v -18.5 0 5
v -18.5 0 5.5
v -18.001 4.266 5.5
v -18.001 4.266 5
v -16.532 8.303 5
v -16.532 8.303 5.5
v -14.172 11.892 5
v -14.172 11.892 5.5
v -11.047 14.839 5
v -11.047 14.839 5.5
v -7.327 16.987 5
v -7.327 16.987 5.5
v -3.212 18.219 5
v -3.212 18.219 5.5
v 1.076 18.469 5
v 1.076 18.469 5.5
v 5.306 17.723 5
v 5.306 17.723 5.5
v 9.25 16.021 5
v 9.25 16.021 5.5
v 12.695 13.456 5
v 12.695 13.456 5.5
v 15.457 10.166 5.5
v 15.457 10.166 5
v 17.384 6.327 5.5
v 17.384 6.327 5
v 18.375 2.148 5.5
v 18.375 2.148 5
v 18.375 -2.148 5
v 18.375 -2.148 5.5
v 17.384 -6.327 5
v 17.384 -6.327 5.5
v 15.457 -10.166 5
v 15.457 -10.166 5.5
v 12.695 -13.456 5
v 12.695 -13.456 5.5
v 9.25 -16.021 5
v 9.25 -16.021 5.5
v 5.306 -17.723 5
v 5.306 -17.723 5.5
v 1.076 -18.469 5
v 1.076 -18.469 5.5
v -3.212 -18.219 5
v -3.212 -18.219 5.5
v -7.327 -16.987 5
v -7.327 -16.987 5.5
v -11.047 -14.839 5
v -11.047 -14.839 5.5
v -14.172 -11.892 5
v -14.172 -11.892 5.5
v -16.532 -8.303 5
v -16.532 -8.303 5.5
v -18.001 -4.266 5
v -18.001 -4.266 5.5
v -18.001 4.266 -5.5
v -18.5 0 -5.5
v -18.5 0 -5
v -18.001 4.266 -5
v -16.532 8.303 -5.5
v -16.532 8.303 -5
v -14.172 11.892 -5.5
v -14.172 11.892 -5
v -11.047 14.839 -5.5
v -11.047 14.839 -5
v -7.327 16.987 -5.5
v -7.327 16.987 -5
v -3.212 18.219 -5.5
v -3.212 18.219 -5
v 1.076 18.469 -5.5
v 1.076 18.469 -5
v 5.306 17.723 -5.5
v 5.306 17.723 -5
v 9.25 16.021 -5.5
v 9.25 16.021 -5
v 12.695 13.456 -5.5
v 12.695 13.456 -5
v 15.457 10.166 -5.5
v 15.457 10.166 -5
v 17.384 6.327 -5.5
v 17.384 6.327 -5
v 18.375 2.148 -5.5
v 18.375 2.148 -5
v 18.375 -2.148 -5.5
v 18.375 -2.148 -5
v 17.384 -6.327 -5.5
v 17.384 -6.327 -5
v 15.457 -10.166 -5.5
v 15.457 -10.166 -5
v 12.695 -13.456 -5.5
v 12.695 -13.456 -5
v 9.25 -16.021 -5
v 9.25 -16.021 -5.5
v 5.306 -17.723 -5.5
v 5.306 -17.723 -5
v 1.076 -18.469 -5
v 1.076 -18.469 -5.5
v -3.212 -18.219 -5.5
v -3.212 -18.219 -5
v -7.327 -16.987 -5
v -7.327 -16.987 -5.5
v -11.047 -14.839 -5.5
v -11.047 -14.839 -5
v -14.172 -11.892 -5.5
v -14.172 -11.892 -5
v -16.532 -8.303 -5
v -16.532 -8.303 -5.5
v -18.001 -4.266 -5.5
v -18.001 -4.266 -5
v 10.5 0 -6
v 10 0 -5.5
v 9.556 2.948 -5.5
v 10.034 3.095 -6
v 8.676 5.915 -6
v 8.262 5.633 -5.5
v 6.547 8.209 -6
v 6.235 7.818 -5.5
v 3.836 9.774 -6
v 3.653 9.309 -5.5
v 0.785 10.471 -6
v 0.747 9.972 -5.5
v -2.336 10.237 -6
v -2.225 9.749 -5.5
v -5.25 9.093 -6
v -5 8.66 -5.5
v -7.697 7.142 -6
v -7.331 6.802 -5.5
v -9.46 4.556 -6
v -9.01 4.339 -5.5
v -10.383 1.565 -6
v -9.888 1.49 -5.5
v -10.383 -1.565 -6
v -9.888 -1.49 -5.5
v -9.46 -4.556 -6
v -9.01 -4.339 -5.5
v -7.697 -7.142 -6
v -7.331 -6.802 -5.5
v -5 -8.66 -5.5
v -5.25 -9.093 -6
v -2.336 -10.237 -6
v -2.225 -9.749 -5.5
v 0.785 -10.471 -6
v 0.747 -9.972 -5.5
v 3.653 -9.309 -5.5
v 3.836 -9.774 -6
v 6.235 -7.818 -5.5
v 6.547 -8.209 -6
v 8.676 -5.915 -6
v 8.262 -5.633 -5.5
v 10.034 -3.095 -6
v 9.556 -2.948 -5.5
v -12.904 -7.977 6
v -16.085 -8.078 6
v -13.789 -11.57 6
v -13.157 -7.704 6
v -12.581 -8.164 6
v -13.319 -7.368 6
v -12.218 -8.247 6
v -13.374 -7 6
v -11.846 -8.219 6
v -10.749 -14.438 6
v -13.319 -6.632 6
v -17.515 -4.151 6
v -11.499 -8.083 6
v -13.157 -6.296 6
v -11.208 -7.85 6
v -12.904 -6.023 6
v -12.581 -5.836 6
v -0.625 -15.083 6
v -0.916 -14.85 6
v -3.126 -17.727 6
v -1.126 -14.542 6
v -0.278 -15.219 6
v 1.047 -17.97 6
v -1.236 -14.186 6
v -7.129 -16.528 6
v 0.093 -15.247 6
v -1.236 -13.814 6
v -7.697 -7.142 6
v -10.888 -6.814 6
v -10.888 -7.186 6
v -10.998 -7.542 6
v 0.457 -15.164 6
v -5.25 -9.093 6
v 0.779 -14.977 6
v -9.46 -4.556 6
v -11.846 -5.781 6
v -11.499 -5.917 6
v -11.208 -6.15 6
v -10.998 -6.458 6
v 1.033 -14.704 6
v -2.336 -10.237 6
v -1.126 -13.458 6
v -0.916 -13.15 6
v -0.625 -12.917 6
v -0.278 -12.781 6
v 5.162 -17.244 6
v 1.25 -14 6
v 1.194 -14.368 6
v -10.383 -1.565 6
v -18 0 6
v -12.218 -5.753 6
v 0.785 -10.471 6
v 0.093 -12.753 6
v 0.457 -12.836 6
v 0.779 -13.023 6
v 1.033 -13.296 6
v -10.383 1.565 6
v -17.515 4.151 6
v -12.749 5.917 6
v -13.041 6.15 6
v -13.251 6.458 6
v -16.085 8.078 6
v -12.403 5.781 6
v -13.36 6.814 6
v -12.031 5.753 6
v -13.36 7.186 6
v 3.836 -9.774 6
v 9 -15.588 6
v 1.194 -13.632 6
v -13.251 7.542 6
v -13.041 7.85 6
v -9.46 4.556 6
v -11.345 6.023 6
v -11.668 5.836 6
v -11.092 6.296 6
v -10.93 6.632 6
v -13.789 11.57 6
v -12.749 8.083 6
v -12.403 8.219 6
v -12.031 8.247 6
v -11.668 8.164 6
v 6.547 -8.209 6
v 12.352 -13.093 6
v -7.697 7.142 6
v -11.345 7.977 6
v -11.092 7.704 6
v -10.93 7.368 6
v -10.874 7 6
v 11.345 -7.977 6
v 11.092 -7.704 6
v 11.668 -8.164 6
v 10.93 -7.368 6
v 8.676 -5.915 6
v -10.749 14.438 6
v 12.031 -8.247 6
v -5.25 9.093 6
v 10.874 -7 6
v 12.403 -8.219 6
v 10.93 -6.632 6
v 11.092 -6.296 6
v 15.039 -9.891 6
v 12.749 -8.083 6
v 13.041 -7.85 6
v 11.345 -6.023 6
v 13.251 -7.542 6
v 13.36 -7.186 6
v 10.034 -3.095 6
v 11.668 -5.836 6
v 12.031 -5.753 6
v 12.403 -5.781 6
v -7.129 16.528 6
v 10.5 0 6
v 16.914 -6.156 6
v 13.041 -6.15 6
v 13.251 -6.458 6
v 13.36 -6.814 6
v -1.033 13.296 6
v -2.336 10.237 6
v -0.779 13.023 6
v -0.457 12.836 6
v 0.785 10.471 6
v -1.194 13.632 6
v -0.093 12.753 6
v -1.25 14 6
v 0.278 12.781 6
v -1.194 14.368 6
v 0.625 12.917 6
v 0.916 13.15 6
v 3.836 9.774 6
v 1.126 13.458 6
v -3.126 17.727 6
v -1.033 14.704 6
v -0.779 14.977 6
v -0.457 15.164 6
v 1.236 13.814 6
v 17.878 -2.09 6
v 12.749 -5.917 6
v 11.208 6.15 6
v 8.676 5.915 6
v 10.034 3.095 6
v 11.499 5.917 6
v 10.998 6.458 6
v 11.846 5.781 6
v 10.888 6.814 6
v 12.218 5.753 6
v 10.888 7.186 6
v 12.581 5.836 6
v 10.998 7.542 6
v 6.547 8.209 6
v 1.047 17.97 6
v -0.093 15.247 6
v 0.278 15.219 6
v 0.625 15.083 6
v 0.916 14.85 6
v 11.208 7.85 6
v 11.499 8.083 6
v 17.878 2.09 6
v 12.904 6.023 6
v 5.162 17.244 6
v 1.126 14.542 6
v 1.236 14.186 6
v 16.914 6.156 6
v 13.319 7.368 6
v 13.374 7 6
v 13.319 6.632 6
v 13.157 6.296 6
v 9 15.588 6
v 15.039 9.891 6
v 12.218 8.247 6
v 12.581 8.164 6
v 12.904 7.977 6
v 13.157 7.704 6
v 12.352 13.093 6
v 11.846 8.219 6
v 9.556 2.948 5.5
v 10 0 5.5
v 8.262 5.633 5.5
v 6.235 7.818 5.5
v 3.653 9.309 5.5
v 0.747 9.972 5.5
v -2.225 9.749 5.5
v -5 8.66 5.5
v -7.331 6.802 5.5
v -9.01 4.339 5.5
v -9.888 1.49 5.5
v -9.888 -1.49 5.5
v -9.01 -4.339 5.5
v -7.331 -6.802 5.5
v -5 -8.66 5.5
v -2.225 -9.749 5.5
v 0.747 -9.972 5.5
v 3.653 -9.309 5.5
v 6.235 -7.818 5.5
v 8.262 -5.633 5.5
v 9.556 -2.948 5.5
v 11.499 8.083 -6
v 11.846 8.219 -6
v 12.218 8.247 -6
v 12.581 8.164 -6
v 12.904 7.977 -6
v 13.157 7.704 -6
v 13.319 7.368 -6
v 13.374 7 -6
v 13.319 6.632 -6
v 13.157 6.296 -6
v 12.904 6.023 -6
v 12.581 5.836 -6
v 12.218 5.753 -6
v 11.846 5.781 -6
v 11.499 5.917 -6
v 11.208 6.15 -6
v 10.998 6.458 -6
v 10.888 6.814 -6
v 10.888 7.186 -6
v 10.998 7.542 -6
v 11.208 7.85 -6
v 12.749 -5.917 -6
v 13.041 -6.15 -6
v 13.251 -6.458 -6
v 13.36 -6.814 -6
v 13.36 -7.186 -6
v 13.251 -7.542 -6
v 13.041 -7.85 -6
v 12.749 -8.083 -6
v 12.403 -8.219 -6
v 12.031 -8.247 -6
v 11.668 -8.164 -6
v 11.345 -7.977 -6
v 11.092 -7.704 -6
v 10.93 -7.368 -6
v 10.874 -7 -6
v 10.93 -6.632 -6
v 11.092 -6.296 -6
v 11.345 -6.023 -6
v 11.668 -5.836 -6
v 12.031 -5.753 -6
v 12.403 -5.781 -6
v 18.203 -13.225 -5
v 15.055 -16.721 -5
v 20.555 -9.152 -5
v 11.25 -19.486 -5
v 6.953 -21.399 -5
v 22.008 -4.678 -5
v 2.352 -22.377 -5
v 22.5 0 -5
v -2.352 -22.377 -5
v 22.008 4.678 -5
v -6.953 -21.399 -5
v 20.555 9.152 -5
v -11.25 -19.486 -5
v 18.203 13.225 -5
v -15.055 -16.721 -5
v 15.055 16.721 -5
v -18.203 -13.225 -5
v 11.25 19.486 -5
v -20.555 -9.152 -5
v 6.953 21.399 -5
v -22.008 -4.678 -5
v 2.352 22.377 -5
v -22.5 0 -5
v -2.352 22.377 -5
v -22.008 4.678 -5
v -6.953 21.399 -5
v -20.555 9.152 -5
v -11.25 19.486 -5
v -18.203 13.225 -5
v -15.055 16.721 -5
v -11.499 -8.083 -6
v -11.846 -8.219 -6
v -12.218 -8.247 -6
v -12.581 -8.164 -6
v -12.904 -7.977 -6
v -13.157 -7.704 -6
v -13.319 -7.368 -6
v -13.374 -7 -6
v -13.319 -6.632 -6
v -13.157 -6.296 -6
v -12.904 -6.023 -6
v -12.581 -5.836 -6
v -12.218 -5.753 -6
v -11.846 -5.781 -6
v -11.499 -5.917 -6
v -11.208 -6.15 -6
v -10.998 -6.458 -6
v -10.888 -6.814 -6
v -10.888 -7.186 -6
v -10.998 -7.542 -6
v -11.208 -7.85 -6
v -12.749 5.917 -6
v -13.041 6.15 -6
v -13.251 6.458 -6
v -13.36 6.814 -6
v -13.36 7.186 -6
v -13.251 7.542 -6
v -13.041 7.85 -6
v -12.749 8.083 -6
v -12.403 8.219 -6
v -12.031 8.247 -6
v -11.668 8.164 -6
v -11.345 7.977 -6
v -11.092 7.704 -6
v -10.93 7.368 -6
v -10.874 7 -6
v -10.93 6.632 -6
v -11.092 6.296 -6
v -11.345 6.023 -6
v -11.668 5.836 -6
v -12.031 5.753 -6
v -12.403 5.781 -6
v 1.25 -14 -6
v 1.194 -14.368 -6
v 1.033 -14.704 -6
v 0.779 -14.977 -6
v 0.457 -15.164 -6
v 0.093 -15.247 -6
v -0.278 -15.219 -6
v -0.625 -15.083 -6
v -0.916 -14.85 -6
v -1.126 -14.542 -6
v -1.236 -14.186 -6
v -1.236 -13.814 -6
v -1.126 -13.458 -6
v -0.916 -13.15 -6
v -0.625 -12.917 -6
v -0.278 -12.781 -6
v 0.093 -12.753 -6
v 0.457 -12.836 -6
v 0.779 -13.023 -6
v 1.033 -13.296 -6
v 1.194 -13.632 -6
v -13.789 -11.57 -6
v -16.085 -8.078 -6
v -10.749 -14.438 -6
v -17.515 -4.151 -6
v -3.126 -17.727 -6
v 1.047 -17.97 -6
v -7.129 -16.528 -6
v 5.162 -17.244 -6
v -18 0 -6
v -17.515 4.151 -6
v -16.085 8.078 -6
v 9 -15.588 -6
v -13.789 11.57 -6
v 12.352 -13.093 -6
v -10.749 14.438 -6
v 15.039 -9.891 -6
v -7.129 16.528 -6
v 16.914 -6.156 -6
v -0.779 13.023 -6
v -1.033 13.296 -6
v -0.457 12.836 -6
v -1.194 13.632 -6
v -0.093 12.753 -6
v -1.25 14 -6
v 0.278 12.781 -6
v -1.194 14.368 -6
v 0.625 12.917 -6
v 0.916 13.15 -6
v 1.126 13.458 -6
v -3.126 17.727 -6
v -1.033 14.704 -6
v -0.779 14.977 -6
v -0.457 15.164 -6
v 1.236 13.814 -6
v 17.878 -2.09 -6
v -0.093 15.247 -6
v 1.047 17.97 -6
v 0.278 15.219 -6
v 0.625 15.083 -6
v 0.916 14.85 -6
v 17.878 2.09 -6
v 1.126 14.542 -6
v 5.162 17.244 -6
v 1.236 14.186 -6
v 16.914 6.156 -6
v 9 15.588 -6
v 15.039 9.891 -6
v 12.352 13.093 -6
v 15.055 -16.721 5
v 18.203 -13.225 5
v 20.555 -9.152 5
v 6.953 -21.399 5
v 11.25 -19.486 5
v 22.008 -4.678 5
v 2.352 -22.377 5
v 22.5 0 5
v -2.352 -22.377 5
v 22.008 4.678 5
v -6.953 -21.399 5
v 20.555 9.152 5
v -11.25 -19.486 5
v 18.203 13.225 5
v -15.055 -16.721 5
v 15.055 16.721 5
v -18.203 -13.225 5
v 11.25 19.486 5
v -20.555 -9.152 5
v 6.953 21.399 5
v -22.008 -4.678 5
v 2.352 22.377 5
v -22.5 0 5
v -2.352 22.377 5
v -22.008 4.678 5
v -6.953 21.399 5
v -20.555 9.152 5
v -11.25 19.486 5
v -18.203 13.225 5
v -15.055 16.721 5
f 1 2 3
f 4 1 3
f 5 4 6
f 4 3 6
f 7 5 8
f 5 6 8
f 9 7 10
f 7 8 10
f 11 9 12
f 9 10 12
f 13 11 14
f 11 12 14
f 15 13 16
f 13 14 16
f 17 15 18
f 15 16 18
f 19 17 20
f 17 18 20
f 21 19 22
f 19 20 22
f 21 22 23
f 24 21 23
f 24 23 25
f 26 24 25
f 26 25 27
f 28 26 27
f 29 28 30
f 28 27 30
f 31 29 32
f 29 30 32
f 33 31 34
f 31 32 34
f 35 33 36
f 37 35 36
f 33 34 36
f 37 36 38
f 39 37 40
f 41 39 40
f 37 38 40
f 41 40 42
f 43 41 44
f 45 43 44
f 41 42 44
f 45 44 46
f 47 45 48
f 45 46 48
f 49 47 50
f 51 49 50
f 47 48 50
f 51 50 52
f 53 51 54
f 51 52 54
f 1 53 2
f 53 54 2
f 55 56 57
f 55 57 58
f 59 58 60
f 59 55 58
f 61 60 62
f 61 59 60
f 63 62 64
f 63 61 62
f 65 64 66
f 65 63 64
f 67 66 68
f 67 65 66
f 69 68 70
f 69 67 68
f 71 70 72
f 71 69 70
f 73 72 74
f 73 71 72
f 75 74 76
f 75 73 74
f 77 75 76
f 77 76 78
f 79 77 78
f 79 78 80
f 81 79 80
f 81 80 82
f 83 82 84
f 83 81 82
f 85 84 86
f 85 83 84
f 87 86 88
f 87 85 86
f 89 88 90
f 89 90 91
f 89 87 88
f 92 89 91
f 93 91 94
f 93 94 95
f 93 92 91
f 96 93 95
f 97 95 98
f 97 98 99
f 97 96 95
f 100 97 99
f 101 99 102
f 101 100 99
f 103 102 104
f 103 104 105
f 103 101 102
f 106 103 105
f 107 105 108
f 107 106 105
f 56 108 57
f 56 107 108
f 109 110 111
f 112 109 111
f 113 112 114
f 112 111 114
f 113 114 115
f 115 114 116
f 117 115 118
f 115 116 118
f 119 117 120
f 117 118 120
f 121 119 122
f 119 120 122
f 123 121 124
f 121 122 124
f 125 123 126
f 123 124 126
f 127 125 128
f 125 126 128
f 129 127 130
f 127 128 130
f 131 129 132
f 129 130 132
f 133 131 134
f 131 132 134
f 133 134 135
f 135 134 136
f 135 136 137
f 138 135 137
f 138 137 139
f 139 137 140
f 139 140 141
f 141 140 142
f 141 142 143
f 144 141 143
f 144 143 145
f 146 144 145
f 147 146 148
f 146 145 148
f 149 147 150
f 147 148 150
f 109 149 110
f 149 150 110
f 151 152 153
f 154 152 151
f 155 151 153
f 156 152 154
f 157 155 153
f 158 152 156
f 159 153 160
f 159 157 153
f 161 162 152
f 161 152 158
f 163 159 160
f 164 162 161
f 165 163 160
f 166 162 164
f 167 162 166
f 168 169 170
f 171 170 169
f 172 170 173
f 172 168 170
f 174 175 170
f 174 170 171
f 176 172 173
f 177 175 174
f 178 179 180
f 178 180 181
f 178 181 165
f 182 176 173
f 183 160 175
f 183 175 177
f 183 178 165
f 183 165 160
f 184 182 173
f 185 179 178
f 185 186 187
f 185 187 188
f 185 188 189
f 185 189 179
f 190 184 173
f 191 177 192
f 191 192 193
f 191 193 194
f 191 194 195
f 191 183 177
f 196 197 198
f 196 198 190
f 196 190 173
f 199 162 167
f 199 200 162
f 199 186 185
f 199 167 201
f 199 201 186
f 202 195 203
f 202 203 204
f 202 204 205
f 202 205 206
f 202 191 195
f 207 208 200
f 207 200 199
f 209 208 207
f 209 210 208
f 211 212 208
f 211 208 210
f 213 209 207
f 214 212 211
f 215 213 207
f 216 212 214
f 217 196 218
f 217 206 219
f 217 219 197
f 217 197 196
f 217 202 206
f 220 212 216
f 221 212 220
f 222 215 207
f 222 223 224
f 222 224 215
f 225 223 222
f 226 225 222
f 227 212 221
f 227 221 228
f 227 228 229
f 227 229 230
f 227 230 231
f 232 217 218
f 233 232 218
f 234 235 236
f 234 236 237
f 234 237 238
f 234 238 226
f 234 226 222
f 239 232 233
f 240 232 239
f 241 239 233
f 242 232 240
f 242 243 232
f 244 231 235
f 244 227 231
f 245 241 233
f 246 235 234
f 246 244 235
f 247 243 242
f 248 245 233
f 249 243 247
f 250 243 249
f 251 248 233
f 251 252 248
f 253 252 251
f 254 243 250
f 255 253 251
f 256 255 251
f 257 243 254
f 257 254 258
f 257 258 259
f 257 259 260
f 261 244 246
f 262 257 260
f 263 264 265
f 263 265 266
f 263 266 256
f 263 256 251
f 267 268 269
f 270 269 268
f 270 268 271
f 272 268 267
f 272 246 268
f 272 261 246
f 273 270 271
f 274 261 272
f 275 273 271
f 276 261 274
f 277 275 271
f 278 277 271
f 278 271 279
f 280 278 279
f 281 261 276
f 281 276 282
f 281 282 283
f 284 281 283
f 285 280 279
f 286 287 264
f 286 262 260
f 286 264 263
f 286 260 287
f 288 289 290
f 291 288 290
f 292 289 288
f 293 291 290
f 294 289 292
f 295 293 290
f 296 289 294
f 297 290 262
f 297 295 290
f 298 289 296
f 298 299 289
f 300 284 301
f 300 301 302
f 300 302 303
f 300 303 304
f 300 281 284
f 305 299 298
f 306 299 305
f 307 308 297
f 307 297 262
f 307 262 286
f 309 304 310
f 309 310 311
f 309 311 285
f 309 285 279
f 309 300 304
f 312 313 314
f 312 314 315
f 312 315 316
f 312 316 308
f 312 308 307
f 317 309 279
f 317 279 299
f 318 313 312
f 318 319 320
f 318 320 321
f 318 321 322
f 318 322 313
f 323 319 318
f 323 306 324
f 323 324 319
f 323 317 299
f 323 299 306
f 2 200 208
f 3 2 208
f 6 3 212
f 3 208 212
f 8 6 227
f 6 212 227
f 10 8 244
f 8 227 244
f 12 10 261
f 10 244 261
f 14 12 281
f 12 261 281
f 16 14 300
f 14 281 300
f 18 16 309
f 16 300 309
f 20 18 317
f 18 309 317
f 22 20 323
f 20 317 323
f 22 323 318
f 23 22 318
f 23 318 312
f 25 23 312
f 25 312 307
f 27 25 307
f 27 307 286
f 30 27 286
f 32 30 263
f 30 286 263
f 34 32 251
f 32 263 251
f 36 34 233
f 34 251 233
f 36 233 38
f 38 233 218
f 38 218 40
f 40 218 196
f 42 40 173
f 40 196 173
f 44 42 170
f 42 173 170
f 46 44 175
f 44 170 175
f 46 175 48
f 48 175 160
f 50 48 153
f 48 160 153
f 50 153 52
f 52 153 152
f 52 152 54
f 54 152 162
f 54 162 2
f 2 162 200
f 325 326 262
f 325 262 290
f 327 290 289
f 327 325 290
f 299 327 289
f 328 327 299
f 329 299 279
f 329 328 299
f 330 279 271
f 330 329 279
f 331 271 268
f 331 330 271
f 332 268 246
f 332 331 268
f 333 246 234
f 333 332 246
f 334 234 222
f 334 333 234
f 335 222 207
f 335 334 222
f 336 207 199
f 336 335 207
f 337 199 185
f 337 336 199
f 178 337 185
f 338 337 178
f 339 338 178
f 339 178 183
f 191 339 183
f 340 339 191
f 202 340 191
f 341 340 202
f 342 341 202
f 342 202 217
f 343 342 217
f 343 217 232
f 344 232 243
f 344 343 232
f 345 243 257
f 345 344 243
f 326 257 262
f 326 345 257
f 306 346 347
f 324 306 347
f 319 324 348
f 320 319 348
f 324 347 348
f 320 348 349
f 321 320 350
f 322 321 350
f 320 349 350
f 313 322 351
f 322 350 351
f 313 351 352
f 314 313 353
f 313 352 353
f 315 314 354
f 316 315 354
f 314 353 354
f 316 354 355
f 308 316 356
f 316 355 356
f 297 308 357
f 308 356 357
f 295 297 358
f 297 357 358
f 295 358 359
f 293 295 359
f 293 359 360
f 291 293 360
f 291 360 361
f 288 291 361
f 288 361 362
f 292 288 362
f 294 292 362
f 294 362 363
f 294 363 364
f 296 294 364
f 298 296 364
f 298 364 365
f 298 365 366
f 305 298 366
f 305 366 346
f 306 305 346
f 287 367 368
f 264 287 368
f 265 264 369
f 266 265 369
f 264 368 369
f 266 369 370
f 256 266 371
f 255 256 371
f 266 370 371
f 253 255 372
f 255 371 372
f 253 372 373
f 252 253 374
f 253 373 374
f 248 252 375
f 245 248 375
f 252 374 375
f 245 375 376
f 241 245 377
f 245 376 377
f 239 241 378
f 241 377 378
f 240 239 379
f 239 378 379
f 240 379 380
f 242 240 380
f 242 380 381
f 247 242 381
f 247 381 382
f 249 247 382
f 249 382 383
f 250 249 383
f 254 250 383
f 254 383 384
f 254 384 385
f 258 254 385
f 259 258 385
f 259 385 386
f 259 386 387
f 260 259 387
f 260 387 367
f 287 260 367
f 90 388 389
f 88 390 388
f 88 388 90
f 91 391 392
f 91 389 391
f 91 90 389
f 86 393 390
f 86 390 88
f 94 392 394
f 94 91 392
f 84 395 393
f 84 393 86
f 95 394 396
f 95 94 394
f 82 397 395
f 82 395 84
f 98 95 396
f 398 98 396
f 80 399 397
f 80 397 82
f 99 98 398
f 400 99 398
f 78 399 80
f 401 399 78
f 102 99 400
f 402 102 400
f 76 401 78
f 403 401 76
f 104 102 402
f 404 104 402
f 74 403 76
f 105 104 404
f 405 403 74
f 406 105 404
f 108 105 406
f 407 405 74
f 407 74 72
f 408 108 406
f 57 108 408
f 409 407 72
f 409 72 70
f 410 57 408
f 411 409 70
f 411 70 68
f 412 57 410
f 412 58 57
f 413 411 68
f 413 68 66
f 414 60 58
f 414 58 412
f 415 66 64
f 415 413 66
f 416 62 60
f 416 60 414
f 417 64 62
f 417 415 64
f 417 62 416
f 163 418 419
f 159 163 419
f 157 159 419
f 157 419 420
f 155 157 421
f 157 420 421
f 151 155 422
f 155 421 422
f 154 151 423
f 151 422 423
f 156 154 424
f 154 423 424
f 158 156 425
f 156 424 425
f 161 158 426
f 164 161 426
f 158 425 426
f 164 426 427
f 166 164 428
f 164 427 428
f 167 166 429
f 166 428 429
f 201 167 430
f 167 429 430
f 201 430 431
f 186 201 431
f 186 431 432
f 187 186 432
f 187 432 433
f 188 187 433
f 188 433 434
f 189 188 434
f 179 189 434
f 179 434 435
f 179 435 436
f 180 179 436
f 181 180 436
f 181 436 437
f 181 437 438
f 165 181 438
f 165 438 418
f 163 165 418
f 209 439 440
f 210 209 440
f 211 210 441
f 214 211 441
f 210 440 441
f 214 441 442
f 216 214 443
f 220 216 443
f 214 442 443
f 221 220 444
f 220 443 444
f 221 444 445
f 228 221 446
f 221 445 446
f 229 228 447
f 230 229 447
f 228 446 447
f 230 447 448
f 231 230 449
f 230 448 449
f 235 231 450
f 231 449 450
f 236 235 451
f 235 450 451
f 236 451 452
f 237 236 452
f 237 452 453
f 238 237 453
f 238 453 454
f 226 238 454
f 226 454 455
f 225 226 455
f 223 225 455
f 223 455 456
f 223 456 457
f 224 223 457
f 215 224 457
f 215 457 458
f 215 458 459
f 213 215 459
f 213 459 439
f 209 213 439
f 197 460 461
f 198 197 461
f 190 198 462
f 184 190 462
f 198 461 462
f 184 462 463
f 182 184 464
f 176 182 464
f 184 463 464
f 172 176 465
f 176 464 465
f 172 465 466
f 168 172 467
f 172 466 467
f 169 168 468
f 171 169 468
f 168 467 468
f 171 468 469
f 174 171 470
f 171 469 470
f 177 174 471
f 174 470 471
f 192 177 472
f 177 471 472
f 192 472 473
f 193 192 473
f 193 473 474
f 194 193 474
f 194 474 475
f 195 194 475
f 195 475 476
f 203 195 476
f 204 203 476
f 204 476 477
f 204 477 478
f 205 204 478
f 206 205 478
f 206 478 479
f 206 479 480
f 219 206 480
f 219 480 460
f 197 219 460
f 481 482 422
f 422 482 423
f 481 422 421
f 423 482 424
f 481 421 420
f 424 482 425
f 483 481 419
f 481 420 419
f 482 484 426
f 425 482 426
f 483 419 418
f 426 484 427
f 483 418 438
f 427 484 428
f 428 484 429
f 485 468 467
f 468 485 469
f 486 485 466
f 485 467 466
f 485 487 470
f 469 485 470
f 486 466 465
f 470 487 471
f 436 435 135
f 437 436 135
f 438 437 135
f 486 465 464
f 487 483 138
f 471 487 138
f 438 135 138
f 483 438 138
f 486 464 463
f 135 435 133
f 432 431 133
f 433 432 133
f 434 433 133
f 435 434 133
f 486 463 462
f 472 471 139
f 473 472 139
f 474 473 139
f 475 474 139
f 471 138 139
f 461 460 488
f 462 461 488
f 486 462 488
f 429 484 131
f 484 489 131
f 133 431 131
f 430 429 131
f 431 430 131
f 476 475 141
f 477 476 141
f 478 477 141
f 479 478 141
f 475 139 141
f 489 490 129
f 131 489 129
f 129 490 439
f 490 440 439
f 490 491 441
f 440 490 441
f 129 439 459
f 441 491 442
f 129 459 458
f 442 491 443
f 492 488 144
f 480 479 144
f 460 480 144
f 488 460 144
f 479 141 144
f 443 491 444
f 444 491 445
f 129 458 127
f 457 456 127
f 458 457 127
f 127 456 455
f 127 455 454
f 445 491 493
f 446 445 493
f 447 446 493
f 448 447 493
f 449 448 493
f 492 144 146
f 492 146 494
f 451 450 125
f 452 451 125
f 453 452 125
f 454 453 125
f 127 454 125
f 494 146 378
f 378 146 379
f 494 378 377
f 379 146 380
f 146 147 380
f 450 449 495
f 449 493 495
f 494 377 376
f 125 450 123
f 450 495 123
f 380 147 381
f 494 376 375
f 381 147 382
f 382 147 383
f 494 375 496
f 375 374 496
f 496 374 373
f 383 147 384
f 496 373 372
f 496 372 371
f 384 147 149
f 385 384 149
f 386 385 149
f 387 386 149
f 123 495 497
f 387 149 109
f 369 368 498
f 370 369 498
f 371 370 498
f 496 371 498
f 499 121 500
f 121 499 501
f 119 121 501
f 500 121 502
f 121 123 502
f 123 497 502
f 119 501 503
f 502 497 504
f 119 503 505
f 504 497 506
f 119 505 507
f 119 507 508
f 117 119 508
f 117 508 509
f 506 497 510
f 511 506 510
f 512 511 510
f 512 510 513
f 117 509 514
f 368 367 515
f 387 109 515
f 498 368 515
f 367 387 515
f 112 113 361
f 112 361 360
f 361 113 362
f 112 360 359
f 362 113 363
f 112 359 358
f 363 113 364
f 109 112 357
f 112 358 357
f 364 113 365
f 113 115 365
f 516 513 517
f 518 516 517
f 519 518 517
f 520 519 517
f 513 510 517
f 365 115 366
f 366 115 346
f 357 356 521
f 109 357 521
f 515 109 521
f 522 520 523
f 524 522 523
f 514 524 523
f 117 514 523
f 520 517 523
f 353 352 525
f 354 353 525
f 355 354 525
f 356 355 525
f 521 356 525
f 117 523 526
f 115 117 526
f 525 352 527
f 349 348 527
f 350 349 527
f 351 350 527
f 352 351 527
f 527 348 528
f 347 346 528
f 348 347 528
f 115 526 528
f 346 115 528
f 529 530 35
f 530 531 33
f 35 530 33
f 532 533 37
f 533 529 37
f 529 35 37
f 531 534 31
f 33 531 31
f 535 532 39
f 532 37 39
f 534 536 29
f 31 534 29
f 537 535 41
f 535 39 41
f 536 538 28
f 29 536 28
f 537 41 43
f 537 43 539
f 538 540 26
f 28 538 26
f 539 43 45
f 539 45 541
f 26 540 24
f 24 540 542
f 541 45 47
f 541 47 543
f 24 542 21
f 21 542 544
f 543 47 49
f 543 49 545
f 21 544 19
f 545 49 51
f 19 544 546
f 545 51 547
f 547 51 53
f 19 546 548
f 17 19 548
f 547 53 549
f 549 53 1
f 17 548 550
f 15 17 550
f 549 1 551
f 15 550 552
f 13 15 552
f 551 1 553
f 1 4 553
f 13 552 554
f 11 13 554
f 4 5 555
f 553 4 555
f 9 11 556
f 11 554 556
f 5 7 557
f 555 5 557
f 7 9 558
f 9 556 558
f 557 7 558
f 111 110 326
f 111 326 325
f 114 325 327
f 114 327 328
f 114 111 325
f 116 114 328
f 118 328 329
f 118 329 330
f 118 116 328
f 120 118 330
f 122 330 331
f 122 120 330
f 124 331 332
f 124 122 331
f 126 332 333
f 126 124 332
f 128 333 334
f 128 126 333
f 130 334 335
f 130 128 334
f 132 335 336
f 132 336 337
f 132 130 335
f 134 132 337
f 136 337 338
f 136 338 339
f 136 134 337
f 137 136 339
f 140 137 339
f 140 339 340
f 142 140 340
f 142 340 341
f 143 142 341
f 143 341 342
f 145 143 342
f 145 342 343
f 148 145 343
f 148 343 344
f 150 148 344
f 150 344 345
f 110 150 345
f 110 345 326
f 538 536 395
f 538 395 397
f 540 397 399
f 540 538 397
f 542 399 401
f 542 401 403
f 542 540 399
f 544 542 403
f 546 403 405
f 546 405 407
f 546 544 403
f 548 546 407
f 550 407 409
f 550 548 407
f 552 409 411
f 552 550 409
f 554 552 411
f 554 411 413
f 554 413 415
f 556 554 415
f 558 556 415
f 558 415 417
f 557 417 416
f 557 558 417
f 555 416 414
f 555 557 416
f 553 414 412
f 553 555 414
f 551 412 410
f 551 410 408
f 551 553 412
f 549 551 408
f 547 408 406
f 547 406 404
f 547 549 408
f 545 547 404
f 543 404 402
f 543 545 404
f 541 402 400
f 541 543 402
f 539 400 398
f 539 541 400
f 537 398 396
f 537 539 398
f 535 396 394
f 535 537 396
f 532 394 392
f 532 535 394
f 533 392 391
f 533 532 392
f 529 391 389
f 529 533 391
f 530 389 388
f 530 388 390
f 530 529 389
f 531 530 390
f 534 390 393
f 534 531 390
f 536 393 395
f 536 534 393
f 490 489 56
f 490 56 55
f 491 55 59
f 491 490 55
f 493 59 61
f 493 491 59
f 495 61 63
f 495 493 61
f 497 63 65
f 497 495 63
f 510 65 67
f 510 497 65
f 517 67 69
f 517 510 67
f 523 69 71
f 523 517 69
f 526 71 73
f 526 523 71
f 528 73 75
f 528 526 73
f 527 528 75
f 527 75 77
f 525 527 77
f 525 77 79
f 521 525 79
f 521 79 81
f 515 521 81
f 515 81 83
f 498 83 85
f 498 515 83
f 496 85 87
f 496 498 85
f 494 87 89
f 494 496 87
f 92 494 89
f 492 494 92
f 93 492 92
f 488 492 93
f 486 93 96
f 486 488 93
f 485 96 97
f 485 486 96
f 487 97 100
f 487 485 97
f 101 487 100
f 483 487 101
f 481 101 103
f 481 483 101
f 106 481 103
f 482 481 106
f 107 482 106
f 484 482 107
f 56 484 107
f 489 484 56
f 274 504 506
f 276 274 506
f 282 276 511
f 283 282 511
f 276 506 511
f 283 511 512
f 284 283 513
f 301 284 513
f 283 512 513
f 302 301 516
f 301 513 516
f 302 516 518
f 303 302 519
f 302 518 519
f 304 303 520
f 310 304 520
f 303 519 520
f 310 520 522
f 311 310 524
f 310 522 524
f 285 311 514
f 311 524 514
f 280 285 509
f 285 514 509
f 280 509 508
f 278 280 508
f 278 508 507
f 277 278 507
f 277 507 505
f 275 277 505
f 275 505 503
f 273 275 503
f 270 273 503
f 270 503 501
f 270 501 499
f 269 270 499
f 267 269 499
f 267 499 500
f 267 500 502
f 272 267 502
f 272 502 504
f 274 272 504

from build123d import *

# Parameters (mm, degrees)
SKETCH_1_R               = 22.5
SKETCH_1_R_2             = 10
EXTRUDE_1_DEPTH          = 6
SKETCH1_OUTSIDE_W        = 59.952
SKETCH1_OUTSIDE_H        = 59.952
SKETCH1_OUTSIDE_R        = 18.5
CUT_EXTRUDE1_DEPTH       = 1
M3_TAPPED_HOLE1_D        = 2.5
PATTERN_CIRCULAR_1_COUNT = 6
CHAMFER_1_SIZE           = 0.5


with BuildPart() as part:
    # 스케치1 → 보스-돌출1 (new, symmetric)
    with BuildSketch(Plane.XY):
        Circle(SKETCH_1_R)
        Circle(SKETCH_1_R_2, mode=Mode.SUBTRACT)
    extrude(amount=EXTRUDE_1_DEPTH, both=True)

    # Sketch1 outside → Cut-Extrude1 (cut)
    with BuildSketch(Plane(origin=(0, 0, -6), x_dir=(-1, 0, 0), z_dir=(0, 0, -1))):
        Rectangle(SKETCH1_OUTSIDE_W, SKETCH1_OUTSIDE_H)
        Circle(SKETCH1_OUTSIDE_R, mode=Mode.SUBTRACT)
    cut_extrude1 = extrude(amount=-CUT_EXTRUDE1_DEPTH, mode=Mode.SUBTRACT)

    # Mirror1: Cut-Extrude1 across plane
    add(cut_extrude1.mirror(Plane.XY), mode=Mode.SUBTRACT)

    # M3 Tapped Hole1 (through all)
    with Locations(Plane.XY.offset(6)):
        with Locations((0, 14)):
            m3_tapped_hole1 = Hole(M3_TAPPED_HOLE1_D / 2)

    # 원형 패턴1: M3 Tapped Hole1 ×6 about axis
    pattern_circular_1_axis = Axis((0, 0, 6), (0, 0, -1))
    for i in range(1, PATTERN_CIRCULAR_1_COUNT):
        add(m3_tapped_hole1.rotate(pattern_circular_1_axis, i * 360 / PATTERN_CIRCULAR_1_COUNT), mode=Mode.SUBTRACT)

    # 모따기1
    chamfer_1_edges = [part.edges().sort_by_distance(p)[0] for p in [
        (-10, 0, -6),
        (-10, 0, 6),
        (18.5, 0, 6),
        (18.5, 0, -6),
    ]]
    chamfer(chamfer_1_edges, length=CHAMFER_1_SIZE)


solid = part.part
